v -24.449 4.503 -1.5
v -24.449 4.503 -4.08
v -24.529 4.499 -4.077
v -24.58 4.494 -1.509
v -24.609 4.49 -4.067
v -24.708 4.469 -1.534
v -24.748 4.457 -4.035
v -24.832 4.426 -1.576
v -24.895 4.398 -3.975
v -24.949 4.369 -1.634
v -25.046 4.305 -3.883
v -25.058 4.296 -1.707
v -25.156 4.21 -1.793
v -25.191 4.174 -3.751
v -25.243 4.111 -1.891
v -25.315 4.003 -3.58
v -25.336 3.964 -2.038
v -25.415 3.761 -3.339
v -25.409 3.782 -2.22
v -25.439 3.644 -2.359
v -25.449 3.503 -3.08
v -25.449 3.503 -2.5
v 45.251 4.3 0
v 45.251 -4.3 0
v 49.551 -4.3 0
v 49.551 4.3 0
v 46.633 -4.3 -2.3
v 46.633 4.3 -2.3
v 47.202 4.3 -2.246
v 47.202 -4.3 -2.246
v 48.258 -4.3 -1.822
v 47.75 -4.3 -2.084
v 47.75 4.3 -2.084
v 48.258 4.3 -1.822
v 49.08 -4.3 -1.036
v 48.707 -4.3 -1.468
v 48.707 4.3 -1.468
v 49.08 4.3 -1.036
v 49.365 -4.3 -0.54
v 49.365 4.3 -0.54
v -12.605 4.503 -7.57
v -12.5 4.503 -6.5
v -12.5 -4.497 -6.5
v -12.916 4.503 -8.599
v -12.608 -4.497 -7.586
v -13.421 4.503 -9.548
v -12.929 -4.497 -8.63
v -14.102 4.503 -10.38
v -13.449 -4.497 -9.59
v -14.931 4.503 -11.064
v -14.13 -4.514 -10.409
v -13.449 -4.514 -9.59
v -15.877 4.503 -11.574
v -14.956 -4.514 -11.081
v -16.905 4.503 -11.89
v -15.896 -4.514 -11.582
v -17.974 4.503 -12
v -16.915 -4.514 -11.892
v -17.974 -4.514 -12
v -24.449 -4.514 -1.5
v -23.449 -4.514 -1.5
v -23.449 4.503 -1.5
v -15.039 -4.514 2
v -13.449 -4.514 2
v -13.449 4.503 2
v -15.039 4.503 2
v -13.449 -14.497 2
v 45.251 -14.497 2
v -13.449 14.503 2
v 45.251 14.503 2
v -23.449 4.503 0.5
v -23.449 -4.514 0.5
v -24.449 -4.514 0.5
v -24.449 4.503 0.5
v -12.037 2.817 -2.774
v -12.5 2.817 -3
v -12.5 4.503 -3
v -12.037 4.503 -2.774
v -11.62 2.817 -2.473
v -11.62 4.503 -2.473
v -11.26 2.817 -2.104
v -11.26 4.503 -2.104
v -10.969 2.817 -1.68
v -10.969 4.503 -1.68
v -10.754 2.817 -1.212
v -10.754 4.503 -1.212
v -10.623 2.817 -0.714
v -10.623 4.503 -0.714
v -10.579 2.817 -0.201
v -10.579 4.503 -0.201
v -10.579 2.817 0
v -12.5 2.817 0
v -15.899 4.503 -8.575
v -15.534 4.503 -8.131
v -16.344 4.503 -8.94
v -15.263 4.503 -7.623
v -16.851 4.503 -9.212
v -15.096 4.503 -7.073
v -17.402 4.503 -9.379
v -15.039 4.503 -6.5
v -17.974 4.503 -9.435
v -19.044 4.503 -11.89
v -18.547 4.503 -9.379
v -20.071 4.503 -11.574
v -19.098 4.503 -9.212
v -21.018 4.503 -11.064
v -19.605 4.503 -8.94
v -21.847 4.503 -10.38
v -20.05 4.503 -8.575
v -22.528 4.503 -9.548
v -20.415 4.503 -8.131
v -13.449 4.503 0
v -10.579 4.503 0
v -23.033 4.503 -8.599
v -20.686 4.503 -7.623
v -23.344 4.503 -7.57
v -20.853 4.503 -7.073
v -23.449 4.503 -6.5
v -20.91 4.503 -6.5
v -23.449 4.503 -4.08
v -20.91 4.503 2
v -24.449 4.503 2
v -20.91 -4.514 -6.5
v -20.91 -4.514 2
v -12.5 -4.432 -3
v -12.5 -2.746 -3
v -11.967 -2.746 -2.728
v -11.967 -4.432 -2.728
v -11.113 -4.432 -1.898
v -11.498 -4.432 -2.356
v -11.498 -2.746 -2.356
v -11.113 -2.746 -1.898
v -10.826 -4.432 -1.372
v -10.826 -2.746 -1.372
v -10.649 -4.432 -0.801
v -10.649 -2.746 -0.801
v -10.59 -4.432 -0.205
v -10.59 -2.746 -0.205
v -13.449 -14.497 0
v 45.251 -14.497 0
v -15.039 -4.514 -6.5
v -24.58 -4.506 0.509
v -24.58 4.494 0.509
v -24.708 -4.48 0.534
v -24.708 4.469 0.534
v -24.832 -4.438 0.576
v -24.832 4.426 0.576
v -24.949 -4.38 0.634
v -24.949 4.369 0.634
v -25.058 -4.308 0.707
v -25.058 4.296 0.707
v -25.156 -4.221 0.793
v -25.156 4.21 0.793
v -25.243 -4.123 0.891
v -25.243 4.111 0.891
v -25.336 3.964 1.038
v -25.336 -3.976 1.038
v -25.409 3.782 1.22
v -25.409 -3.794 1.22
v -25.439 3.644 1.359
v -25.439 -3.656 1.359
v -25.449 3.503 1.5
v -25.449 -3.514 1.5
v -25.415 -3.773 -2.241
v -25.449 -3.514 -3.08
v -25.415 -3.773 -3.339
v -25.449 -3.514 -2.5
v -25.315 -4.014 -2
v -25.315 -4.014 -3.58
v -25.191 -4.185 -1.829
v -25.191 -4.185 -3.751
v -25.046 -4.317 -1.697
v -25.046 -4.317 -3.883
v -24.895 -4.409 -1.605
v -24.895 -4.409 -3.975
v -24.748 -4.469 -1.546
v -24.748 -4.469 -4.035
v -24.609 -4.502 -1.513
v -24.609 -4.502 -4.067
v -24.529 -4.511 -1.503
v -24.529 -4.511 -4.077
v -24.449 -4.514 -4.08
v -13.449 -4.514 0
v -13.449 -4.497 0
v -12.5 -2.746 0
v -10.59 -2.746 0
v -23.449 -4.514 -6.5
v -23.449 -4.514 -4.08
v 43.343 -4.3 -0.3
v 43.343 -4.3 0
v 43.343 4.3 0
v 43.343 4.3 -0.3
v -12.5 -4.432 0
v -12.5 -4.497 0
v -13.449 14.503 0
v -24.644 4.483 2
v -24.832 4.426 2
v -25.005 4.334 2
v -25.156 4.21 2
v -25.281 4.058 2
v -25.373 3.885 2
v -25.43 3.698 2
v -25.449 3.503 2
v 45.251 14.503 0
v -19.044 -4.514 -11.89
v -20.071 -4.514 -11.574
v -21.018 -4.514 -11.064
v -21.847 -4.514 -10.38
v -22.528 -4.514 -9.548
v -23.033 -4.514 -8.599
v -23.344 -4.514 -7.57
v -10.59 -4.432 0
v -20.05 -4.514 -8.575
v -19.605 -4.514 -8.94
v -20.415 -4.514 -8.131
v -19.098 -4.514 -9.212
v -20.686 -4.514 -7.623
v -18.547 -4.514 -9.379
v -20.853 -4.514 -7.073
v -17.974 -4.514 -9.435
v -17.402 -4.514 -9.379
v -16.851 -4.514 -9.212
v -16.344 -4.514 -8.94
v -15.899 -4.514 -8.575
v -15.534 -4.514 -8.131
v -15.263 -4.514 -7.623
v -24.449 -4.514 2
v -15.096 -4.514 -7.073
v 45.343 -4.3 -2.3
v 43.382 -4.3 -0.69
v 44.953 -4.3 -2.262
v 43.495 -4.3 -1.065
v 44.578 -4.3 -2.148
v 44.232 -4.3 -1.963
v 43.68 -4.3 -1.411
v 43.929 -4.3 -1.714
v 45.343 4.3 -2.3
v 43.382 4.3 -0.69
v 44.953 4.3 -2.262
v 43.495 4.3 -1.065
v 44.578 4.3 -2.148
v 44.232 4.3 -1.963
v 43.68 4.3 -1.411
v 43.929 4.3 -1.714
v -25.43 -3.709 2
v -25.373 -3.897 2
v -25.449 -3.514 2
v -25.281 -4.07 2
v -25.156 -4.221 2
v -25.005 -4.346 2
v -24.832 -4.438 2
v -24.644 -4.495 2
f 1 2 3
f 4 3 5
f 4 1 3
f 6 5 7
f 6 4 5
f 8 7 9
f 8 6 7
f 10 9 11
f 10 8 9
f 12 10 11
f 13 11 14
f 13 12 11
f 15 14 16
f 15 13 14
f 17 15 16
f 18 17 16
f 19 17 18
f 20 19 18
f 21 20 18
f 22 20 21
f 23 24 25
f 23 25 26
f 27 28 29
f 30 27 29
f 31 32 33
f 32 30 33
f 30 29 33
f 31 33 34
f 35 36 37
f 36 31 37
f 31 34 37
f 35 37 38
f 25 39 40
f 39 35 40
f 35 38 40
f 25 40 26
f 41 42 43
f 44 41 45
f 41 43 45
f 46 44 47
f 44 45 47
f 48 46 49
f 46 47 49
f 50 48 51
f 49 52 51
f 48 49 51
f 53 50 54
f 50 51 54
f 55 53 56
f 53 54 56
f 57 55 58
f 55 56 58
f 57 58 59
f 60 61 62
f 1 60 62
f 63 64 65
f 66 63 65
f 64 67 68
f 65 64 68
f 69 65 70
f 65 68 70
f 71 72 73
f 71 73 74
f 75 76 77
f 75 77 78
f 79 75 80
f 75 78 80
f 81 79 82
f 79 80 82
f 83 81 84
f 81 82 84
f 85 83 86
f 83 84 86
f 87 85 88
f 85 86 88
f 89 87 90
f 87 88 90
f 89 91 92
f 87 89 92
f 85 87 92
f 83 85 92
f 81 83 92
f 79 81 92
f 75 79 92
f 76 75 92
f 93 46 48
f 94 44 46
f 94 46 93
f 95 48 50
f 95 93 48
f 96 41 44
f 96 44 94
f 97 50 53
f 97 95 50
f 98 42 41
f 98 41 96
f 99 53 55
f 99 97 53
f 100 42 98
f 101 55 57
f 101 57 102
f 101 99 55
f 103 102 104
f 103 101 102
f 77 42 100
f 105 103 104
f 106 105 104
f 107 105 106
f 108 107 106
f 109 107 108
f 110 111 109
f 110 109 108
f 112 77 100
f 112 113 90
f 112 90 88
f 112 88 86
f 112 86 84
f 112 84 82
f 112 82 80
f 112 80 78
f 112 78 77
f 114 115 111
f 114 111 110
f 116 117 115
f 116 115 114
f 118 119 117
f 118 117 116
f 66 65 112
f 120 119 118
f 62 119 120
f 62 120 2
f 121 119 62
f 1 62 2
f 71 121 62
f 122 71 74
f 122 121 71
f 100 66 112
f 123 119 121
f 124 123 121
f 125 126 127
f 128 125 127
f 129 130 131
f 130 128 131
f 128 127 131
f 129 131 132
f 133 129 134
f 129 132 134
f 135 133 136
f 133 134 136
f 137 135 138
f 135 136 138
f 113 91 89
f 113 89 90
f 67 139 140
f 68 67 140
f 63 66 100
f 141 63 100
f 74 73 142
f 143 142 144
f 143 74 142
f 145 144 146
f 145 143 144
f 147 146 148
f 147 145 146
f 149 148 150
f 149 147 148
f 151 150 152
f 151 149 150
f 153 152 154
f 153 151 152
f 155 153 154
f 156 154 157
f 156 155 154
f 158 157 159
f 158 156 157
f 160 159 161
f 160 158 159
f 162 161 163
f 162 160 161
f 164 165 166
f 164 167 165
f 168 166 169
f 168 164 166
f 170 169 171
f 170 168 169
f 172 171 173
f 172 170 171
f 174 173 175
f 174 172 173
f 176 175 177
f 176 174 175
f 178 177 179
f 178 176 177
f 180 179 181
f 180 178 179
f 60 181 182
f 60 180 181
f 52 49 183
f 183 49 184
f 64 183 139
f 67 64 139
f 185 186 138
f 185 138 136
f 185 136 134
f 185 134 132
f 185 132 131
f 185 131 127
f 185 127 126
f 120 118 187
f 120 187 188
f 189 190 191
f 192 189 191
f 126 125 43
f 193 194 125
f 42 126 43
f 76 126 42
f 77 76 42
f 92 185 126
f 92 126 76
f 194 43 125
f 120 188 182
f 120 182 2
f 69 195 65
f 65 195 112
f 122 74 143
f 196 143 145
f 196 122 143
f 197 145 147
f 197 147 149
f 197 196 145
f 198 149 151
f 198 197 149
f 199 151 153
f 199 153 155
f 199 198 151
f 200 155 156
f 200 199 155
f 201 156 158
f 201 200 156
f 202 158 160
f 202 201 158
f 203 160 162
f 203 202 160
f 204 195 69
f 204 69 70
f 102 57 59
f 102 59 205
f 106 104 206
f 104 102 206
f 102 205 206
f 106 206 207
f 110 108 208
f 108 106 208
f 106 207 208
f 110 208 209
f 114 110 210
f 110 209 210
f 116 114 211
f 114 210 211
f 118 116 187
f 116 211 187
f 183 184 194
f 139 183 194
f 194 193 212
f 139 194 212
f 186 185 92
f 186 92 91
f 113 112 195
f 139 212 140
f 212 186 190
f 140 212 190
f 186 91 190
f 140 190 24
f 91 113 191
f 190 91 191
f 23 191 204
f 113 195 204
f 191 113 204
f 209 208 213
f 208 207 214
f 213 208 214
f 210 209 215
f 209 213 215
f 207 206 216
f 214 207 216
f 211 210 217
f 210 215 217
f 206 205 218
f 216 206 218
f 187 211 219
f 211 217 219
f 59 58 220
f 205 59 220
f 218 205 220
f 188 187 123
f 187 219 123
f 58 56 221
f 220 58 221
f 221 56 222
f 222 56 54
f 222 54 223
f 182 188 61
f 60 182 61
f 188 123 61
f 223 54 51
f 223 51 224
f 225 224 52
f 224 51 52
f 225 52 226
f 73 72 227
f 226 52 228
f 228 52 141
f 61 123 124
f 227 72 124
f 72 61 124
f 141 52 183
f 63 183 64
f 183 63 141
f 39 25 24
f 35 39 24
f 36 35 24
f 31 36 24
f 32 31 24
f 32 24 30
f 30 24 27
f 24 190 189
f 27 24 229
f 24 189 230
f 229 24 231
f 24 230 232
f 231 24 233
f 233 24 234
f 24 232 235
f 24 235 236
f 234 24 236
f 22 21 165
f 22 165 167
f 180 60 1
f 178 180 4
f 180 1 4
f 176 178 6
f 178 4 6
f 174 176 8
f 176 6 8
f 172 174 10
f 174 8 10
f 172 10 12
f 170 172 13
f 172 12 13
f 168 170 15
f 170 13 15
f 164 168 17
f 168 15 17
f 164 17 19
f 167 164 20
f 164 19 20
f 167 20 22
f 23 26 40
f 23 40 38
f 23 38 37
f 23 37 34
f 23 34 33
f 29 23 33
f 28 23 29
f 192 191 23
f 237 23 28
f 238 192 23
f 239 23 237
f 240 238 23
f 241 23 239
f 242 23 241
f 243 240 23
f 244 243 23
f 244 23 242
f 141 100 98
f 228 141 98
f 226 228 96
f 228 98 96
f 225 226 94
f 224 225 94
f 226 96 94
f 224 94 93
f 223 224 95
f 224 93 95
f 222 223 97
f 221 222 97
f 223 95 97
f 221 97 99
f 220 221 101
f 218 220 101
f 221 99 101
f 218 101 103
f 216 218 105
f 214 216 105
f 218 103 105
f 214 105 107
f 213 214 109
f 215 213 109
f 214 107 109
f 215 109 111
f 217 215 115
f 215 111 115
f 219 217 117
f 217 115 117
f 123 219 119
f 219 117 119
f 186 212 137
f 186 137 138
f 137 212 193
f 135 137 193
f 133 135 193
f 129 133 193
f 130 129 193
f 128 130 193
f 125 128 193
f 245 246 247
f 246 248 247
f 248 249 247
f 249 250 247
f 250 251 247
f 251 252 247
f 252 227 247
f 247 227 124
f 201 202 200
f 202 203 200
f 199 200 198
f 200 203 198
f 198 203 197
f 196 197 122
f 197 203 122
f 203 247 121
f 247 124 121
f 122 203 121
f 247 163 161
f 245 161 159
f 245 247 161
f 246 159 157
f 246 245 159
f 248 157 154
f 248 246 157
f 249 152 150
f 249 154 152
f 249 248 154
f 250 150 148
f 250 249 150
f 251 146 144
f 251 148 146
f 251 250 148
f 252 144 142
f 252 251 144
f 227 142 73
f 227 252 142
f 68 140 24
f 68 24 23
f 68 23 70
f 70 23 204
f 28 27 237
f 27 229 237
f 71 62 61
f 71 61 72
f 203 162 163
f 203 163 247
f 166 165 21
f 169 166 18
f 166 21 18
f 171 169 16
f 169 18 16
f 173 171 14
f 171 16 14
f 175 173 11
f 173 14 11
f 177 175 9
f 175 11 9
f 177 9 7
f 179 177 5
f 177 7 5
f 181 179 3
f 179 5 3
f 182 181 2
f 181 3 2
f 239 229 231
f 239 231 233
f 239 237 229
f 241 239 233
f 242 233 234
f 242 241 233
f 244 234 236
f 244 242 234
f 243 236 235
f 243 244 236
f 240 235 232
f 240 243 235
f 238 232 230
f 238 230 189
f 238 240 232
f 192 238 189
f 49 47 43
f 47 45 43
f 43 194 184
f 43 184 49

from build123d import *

# Parameters (mm, degrees)
SKETCH1_W           = 58.7
SKETCH1_H           = 14.5
BOSS_EXTRUDE1_DEPTH = 2
SKETCH2_W           = 1.907537222
SKETCH2_H           = 8.6
BOSS_EXTRUDE2_DEPTH = 4.3
SKETCH3_W           = 2.3
SKETCH3_H           = 8.6
BOSS_EXTRUDE3_DEPTH = 4.3
FILLET3_R           = 2
SKETCH4_W           = 0.949738238
SKETCH4_H           = 9
BOSS_EXTRUDE4_DEPTH = 12
SKETCH5_W           = 14
SKETCH5_H           = 9.016953004
BOSS_EXTRUDE5_DEPTH = 10
FILLET4_R           = 5.5
CUT_EXTRUDE1_DEPTH  = 12
SKETCH8_W           = 2.580145407
SKETCH8_H           = 9.016953004
SKETCH8_W_2         = 1.5
BOSS_EXTRUDE6_DEPTH = 2
SKETCH9_W           = 1.920869139
SKETCH9_H           = 1.685794619
SKETCH9_H_2         = 1.68579462
BOSS_EXTRUDE7_DEPTH = 3
FILLET6_R           = 3
FILLET9_R           = 3
FILLET11_R          = 1
FILLET12_R          = 1


with BuildPart() as part:
    # Sketch1 → Boss-Extrude1 (new body)
    with BuildSketch(Plane.XY):
        with Locations((15.900667763, -7.24741023)):
            Rectangle(SKETCH1_W, SKETCH1_H)
        with Locations((15.900667763, 7.25258977)):
            Rectangle(SKETCH1_W, SKETCH1_H)
    extrude(amount=BOSS_EXTRUDE1_DEPTH)

    # Sketch2 → Boss-Extrude2 (add)
    with BuildSketch(Plane.XY.offset(2)):
        with Locations((44.296899152, 0)):
            Rectangle(SKETCH2_W, SKETCH2_H)
    extrude(amount=-BOSS_EXTRUDE2_DEPTH)

    # Sketch3 → Boss-Extrude3 (add)
    with BuildSketch(Plane(origin=(45.250667763, 0, 0), x_dir=(0, 0, -1), z_dir=(1, 0, 0))):
        with Locations((1.15, 0)):
            Rectangle(SKETCH3_W, SKETCH3_H)
    extrude(amount=BOSS_EXTRUDE3_DEPTH)

    # Fillet3
    fillet3_edges = [part.edges().sort_by_distance(p)[0] for p in [
        (43.343130541, 0, -2.3),
    ]]
    fillet(fillet3_edges, radius=FILLET3_R)

    # Sketch4 → Boss-Extrude4 (add)
    with BuildSketch(Plane(origin=(0, 0, 0), x_dir=(-1, 0, 0), z_dir=(0, 0, -1))):
        with Locations((12.974463118, 0.00258977)):
            Rectangle(SKETCH4_W, SKETCH4_H)
    extrude(amount=BOSS_EXTRUDE4_DEPTH)

    # Sketch5 → Boss-Extrude5 (add)
    with BuildSketch(Plane.ZY.offset(13.449332237)):
        with Locations((-5, -0.005886732)):
            Rectangle(SKETCH5_W, SKETCH5_H)
    extrude(amount=BOSS_EXTRUDE5_DEPTH)

    # Fillet4
    # the kernel refuses this fillet: 5.5 mm, written as the material it takes off along each edge
    with BuildSketch(Plane(origin=(-23.449332237, -18.264363234, -12), x_dir=(1, 0, 0), z_dir=(0, 1, 0))) as fillet4_piece_1:
        with BuildLine():
            CenterArc((FILLET4_R, -FILLET4_R), FILLET4_R, 90, 90)
            Line((0, -FILLET4_R), (0, 0))
            Line((0, 0), (FILLET4_R, 0))
        make_face()
    extrude(amount=36.516953004, mode=Mode.SUBTRACT)
    with BuildSketch(Plane(origin=(-12.499593999, -18.24741023, -12), x_dir=(-1, 0, 0), z_dir=(0, 1, 0))) as fillet4_piece_2:
        with BuildLine():
            CenterArc((FILLET4_R, FILLET4_R), FILLET4_R, 180, 90)
            Line((0, FILLET4_R), (0, 0))
            Line((0, 0), (FILLET4_R, 0))
        make_face()
    extrude(amount=36.5, mode=Mode.SUBTRACT)

    # Sketch7 → Cut-Extrude1 (cut)
    with BuildSketch(Plane(origin=(0, 4.50258977, 0), x_dir=(1, 0, 0), z_dir=(0, 1, 0))):
        with BuildLine():
            ThreePointArc((-15.03934254, 6.5), (-17.974463118, 9.435120578), (-20.909583696, 6.5))
            Line((-20.909583696, 6.5), (-15.03934254, 6.5))
        make_face()
        with BuildLine():
            Line((-15.03934254, 6.5), (-20.909583696, 6.5))
            ThreePointArc((-20.909583696, 6.5), (-17.974463118, 3.564879422), (-15.03934254, 6.5))
        make_face()
        with BuildLine():
            ThreePointArc((-15.03934254, 6.5), (-17.974463118, 3.564879422), (-20.909583696, 6.5))
            Line((-20.909583696, 6.5), (-20.909583696, -2))
            Line((-20.909583696, -2), (-15.03934254, -2))
            Line((-15.03934254, -2), (-15.03934254, 6.5))
        make_face()
    extrude(amount=-CUT_EXTRUDE1_DEPTH, mode=Mode.SUBTRACT)

    # Sketch8 → Boss-Extrude6 (add)
    with BuildSketch(Plane.ZY.offset(23.449332237)):
        with Locations((-2.790072703, -0.005886732)):
            Rectangle(SKETCH8_W, SKETCH8_H)
        with Locations((1.25, -0.005886732)):
            Rectangle(SKETCH8_W_2, SKETCH8_H)
    extrude(amount=BOSS_EXTRUDE6_DEPTH)

    # Sketch9 → Boss-Extrude7 (add)
    with BuildSketch(Plane(origin=(0, 0, 0), x_dir=(-1, 0, 0), z_dir=(0, 0, -1))):
        with Locations((11.550124457, -3.589191377)):
            Rectangle(SKETCH9_W, SKETCH9_H)
        with Locations((11.539159429, 3.65969246)):
            Rectangle(SKETCH9_W, SKETCH9_H_2)
    extrude(amount=BOSS_EXTRUDE7_DEPTH)

    # Fillet6
    # the kernel refuses this fillet: 3 mm, written as the material it takes off along each edge
    with BuildSketch(Plane(origin=(-10.589689887, 4.241056538, -3), x_dir=(-1, 0, 0), z_dir=(0, -1, 0))) as fillet6_piece_1_section:
        with BuildLine():
            CenterArc((3, -2.794940242), FILLET6_R, 111.307014795, 68.692985205)
            Line((0, -2.794940242), (0, 0))
            Line((0, 0), (1.909904112, 0))
        make_face()
    fillet6_piece_1 = extrude(amount=15.660495829, mode=Mode.PRIVATE)
    fillet6_piece_1 = split(fillet6_piece_1, bisect_by=Plane(origin=(-11.107813793, 2.81679515, -1.901033535), z_dir=(0, -1, 0)), keep=Keep.TOP, mode=Mode.PRIVATE)
    add(fillet6_piece_1, mode=Mode.SUBTRACT)
    with BuildSketch(Plane(origin=(-10.57872486, 11.500570097, -3), x_dir=(-1, 0, 0), z_dir=(0, -1, 0))) as fillet6_piece_2:
        with BuildLine():
            CenterArc((3, -2.799192131), FILLET6_R, 111.082404826, 68.917595174)
            Line((0, -2.799192131), (0, 0))
            Line((0, 0), (1.920869139, 0))
        make_face()
    extrude(amount=15.681755273, mode=Mode.SUBTRACT)

    # Fillet9
    # the kernel refuses this fillet: 3 mm, written as the material it takes off along each edge
    with BuildSketch(Plane(origin=(49.550667763, 11.592976073, -2.3), x_dir=(-1, 0, 0), z_dir=(0, -1, 0))) as fillet9_piece_1:
        with BuildLine():
            CenterArc((2.917190429, -3), FILLET9_R, 90, 76.506601178)
            Line((0, -2.3), (-0.058343809, -2.286))
            ThreePointArc((-0.058343809, -2.286), (-0.06, -1.15), (-0.06, 0))
            Line((-0.06, 0), (0, 0.06))
            Line((0, 0.06), (2.917190429, 0.06))
            Line((2.917190429, 0.06), (2.917190429, 0))
        make_face()
    extrude(amount=23.185952146, mode=Mode.SUBTRACT)

    # Fillet11
    fillet11_edges = [part.edges().sort_by_distance(p)[0] for p in [
        (-25.449332237, -0.005886732, -4.080145407),
        (-25.449332237, -4.514363234, -2.790072704),
        (-25.449332237, -0.005886732, -1.5),
        (-25.449332237, 4.50258977, -2.790072704),
    ]]
    fillet(fillet11_edges, radius=FILLET11_R)

    # Fillet12
    fillet12_edges = [part.edges().sort_by_distance(p)[0] for p in [
        (-25.449332237, 4.50258977, 1.25),
        (-25.449332237, -0.005886732, 0.5),
        (-25.449332237, -4.514363234, 1.25),
    ]]
    fillet(fillet12_edges, radius=FILLET12_R)


solid = part.part
